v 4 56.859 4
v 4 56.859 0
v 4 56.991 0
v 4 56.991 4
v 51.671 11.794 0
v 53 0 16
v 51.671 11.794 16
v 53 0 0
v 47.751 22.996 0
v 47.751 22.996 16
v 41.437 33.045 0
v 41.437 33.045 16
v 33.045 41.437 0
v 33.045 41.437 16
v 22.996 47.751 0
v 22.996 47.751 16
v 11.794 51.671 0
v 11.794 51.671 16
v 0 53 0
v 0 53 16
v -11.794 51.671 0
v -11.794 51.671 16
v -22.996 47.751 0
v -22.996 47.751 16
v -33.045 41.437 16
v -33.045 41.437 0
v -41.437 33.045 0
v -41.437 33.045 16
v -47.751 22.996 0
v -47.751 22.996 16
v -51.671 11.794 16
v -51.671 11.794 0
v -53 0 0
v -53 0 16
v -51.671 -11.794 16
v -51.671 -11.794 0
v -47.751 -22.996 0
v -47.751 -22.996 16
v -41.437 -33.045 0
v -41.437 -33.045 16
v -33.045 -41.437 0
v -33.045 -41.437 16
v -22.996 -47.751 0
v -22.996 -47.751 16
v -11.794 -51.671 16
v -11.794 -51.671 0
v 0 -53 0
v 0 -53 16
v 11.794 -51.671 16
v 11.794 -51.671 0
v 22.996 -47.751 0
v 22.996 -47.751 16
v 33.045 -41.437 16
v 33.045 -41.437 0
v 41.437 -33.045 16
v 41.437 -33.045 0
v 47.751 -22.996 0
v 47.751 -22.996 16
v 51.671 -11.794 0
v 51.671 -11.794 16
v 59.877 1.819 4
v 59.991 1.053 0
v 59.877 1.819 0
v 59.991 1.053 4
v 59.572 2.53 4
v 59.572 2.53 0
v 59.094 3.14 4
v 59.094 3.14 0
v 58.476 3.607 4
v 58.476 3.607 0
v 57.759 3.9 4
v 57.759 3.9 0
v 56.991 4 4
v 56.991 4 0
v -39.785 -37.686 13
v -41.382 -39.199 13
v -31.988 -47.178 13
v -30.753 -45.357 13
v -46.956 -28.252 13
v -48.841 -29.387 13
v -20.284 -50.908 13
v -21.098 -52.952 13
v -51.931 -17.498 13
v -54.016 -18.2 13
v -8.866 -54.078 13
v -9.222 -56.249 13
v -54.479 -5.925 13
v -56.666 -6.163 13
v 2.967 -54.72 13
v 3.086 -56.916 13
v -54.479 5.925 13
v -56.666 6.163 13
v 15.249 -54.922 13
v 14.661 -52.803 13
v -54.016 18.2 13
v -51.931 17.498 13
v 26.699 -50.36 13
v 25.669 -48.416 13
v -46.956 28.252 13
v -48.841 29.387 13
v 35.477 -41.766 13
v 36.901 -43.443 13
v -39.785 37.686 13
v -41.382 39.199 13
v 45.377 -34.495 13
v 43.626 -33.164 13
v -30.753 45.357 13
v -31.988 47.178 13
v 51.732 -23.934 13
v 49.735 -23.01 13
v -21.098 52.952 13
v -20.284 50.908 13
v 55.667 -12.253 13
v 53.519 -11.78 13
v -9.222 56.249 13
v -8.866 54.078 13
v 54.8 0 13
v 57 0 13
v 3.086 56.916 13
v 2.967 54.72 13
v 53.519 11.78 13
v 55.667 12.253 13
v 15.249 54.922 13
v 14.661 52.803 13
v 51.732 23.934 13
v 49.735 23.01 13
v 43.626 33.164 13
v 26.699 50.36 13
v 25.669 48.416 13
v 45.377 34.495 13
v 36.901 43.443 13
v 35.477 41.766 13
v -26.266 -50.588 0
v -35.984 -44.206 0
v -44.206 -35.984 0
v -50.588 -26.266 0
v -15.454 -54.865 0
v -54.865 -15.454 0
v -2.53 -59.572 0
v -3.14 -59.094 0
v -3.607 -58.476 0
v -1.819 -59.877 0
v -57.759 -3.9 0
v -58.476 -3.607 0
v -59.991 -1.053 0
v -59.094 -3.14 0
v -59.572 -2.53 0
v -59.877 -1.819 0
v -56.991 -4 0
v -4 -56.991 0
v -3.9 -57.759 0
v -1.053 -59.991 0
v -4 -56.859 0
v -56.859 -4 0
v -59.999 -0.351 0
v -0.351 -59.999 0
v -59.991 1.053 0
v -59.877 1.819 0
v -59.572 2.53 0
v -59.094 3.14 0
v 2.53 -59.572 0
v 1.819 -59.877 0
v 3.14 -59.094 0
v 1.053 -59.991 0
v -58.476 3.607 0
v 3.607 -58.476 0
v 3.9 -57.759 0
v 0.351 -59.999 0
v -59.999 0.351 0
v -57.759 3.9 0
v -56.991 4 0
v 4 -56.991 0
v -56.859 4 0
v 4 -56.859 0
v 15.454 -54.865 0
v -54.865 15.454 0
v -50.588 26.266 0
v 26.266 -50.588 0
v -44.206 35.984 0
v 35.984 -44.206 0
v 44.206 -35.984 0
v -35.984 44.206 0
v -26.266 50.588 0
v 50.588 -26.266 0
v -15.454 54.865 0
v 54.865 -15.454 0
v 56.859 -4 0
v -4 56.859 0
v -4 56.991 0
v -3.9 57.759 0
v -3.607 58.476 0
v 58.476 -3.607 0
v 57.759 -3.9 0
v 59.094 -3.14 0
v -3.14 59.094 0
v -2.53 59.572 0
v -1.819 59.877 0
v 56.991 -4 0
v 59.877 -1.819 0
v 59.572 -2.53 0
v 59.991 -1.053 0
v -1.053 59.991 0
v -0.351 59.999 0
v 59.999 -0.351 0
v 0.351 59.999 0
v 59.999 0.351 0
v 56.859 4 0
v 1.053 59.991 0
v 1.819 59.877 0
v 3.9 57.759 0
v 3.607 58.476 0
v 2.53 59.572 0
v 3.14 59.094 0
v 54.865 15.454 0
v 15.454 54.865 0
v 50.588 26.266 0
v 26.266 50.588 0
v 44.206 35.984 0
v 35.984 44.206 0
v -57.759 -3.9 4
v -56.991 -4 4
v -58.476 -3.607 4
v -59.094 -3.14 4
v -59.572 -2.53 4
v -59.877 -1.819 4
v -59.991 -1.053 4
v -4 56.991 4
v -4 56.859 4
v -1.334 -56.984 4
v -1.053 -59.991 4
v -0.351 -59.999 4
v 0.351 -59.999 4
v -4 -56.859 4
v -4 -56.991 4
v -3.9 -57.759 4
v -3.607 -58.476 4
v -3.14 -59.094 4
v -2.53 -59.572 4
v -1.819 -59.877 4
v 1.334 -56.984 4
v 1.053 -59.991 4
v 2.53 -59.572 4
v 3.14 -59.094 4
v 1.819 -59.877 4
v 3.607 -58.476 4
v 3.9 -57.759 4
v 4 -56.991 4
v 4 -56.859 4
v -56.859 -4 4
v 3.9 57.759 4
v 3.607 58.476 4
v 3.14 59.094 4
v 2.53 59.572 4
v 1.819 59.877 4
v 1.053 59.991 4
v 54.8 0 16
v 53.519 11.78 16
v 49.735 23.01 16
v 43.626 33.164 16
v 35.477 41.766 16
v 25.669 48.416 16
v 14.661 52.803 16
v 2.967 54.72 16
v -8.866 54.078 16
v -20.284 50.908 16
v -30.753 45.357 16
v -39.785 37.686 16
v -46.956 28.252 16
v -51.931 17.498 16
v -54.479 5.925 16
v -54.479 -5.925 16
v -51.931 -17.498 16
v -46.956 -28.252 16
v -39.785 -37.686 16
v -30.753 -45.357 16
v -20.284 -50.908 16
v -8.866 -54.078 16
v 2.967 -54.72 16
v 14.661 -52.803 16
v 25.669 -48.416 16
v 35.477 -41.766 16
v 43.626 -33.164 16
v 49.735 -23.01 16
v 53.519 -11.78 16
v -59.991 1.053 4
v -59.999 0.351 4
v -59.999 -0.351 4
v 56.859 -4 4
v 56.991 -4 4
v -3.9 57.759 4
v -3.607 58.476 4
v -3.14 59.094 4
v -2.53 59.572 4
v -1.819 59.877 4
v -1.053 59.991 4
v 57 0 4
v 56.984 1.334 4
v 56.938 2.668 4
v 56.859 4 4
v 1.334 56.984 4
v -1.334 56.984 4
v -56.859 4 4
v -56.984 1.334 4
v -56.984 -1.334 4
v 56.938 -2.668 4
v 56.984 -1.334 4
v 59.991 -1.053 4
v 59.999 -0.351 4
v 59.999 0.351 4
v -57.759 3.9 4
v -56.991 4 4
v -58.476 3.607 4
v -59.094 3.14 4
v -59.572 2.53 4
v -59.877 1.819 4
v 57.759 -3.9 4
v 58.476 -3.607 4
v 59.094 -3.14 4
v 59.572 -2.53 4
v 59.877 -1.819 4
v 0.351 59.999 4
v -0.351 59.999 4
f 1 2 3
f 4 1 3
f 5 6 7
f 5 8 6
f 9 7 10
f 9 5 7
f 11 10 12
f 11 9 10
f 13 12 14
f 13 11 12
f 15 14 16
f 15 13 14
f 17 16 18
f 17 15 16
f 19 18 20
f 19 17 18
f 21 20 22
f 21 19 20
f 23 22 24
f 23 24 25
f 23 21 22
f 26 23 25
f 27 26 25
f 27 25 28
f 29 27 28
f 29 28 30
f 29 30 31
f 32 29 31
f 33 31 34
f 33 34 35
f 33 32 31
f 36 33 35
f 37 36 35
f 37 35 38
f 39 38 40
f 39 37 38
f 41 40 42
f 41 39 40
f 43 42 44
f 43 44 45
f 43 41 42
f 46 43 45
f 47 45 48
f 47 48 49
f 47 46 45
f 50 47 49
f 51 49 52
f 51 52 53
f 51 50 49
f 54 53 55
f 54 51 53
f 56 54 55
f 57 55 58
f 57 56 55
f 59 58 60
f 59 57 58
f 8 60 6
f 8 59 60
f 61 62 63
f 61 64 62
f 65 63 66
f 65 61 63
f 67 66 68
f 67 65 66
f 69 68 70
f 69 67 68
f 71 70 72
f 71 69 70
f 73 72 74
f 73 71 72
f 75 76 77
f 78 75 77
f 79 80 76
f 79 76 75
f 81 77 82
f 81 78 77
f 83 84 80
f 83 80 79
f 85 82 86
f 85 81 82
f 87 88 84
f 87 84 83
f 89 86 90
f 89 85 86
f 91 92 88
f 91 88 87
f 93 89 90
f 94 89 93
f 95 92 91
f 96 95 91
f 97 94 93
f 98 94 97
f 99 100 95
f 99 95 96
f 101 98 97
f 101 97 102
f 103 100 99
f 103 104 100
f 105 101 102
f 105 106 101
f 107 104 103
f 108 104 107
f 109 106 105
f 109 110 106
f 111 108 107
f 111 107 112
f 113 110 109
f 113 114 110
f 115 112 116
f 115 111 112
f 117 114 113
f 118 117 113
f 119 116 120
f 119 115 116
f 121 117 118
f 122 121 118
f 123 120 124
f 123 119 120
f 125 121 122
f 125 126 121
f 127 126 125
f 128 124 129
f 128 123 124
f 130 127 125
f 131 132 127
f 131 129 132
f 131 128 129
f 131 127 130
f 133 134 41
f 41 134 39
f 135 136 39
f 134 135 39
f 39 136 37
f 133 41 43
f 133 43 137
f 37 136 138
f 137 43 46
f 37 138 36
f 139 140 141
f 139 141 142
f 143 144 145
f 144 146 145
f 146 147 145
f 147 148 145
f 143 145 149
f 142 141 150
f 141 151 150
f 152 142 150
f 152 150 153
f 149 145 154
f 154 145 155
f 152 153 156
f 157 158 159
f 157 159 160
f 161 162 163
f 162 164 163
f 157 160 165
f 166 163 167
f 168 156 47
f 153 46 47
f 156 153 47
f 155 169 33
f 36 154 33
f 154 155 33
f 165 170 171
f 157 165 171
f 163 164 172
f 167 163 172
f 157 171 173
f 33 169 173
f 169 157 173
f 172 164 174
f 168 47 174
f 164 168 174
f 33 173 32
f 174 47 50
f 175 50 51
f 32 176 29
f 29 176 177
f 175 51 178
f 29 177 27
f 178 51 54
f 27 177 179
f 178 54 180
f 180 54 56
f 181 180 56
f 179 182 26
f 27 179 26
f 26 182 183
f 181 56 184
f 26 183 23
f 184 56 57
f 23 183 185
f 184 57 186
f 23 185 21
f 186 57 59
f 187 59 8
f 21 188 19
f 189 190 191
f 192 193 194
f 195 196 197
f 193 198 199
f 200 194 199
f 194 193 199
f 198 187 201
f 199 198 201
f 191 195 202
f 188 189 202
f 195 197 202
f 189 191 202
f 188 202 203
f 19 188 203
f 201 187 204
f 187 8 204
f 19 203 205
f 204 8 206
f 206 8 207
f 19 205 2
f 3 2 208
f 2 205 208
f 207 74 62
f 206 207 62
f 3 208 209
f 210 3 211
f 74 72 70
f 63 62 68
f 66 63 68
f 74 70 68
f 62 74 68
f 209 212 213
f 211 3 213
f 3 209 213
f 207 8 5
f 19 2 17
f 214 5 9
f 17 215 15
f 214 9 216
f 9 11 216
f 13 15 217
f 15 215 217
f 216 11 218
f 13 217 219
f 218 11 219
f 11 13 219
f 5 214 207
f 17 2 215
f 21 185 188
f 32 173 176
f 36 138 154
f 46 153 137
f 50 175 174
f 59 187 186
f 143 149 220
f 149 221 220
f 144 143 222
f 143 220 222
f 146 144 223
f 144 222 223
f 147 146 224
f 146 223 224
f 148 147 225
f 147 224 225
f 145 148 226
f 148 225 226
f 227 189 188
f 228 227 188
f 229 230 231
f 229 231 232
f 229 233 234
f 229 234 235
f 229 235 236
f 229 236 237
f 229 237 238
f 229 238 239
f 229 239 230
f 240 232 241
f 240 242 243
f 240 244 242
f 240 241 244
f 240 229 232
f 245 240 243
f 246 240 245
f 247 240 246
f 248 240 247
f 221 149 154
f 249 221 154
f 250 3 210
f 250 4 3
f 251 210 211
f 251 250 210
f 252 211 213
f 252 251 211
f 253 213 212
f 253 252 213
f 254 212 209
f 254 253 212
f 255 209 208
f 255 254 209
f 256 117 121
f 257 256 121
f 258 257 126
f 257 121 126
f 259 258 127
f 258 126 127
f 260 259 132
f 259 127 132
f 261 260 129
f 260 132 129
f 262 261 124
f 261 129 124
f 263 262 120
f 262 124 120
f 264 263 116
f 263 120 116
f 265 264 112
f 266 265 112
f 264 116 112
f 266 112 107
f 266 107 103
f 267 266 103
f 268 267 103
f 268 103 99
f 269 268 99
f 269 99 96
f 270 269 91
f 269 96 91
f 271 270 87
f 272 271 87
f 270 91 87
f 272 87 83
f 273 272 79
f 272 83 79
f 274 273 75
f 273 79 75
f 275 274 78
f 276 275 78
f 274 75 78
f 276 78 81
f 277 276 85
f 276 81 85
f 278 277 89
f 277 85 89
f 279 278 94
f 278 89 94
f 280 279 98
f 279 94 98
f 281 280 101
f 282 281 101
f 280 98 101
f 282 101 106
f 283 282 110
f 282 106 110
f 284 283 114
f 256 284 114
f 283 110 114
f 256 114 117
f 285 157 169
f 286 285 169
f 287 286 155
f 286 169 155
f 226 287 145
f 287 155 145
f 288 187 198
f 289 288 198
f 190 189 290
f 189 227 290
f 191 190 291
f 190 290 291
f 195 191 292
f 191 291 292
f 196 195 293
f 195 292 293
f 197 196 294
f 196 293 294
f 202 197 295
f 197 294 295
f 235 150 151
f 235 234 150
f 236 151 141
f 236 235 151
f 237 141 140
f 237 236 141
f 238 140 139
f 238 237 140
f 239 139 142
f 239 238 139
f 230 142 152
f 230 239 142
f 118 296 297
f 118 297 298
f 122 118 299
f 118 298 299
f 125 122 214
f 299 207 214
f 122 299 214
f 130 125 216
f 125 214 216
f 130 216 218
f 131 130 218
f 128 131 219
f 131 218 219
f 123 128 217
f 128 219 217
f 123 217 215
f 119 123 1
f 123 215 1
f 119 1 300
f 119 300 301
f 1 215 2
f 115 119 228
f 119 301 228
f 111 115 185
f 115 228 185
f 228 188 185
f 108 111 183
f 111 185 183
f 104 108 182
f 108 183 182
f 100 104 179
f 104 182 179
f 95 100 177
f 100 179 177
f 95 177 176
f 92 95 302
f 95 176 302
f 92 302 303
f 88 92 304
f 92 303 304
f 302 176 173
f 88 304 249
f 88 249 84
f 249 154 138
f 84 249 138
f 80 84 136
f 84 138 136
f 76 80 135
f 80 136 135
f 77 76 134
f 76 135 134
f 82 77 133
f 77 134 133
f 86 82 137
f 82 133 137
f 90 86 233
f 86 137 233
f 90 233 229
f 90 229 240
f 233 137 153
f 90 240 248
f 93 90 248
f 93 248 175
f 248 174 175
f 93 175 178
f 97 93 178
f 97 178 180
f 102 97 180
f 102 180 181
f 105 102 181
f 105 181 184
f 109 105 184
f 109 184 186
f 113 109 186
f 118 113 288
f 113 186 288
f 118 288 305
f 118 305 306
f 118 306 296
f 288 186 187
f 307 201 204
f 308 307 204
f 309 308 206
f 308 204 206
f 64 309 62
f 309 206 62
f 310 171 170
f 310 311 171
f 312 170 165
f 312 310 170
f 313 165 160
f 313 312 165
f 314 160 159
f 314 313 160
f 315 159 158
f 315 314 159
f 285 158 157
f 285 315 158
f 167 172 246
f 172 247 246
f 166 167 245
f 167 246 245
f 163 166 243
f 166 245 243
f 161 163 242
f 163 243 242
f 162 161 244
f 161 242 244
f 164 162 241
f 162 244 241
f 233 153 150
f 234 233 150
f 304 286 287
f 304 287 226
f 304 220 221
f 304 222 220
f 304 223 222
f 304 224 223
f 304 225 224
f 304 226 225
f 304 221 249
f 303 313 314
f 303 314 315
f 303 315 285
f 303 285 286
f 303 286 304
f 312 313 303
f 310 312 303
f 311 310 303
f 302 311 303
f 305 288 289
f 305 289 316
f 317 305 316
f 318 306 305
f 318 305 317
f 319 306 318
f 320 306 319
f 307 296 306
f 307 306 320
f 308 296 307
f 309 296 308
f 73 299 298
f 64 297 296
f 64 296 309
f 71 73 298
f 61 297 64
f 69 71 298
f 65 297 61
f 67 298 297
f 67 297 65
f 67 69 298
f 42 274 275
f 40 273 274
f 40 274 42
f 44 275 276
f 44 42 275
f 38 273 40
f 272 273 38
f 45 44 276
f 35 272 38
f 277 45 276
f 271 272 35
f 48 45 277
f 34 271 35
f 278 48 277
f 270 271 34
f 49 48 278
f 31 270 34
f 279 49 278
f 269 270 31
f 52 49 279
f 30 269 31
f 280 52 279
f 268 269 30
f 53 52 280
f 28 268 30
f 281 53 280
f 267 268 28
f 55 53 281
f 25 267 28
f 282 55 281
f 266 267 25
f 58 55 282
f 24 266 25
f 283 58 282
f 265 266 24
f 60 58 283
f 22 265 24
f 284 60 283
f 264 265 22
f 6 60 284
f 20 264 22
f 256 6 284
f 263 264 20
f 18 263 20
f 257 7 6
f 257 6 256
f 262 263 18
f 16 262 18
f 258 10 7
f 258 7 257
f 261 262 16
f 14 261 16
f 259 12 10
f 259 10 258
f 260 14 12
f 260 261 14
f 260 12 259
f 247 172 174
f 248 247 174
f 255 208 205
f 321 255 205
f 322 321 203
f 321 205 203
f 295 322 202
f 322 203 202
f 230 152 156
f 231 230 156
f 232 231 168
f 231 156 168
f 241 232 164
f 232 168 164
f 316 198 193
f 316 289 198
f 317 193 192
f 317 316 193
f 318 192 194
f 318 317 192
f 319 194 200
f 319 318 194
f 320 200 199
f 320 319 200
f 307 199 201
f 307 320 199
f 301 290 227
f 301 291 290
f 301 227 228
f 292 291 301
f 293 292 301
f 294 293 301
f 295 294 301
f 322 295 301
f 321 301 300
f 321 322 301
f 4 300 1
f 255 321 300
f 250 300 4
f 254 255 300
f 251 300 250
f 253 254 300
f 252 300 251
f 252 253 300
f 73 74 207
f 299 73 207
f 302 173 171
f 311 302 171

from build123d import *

# Parameters (mm, degrees)
F0_R     = 57
F0_R_2   = 53
F1_DEPTH = 13
F3_DEPTH = 4
F4_R     = 3
F5_R     = 54.8
F5_R_2   = 53
F6_DEPTH = 3


with BuildPart() as f1:
    # F0 (on Top) → F1 (new body)
    with BuildSketch(Plane.XY):
        Circle(F0_R)
        Circle(F0_R_2, mode=Mode.SUBTRACT)
    extrude(amount=F1_DEPTH)

    # F2 (on Top) → F3 (join)
    with BuildSketch(Plane.XY):
        with BuildLine():
            Line((-56.859476, 4), (-59.866518, 4))
            ThreePointArc((-59.866518, 4), (-60, 0), (-59.866518, -4))
            Line((-59.866518, -4), (-56.859476, -4))
            ThreePointArc((-56.859476, -4), (-57, 0), (-56.859476, 4))
        make_face()
        with BuildLine():
            ThreePointArc((4, 59.866518), (0, 60), (-4, 59.866518))
            Line((-4, 59.866518), (-4, 56.859476))
            ThreePointArc((-4, 56.859476), (0, 57), (4, 56.859476))
            Line((4, 56.859476), (4, 59.866518))
        make_face()
        with BuildLine():
            ThreePointArc((-4, -59.866518), (0, -60), (4, -59.866518))
            Line((4, -59.866518), (4, -56.859476))
            ThreePointArc((4, -56.859476), (0, -57), (-4, -56.859476))
            Line((-4, -56.859476), (-4, -59.866518))
        make_face()
        with BuildLine():
            Line((56.859476, -4), (59.866518, -4))
            ThreePointArc((59.866518, -4), (60, 0), (59.866518, 4))
            Line((59.866518, 4), (56.859476, 4))
            ThreePointArc((56.859476, 4), (57, 0), (56.859476, -4))
        make_face()
    extrude(amount=F3_DEPTH)

    # F4
    f4_edges = [f1.edges().sort_by_distance(p)[0] for p in [
        (59.866518, -4, 2),
        (59.866518, 4, 2),
        (-4, -59.866518, 2),
        (4, -59.866518, 2),
        (-59.866518, -4, 2),
        (-59.866518, 4, 2),
        (-4, 59.866518, 2),
        (4, 59.866518, 2),
    ]]
    fillet(f4_edges, radius=F4_R)

    # F5 (on face) → F6 (join)
    with BuildSketch(Plane.XY.offset(13)):
        Circle(F5_R)
        Circle(F5_R_2, mode=Mode.SUBTRACT)
    extrude(amount=F6_DEPTH)


solid = f1.part
